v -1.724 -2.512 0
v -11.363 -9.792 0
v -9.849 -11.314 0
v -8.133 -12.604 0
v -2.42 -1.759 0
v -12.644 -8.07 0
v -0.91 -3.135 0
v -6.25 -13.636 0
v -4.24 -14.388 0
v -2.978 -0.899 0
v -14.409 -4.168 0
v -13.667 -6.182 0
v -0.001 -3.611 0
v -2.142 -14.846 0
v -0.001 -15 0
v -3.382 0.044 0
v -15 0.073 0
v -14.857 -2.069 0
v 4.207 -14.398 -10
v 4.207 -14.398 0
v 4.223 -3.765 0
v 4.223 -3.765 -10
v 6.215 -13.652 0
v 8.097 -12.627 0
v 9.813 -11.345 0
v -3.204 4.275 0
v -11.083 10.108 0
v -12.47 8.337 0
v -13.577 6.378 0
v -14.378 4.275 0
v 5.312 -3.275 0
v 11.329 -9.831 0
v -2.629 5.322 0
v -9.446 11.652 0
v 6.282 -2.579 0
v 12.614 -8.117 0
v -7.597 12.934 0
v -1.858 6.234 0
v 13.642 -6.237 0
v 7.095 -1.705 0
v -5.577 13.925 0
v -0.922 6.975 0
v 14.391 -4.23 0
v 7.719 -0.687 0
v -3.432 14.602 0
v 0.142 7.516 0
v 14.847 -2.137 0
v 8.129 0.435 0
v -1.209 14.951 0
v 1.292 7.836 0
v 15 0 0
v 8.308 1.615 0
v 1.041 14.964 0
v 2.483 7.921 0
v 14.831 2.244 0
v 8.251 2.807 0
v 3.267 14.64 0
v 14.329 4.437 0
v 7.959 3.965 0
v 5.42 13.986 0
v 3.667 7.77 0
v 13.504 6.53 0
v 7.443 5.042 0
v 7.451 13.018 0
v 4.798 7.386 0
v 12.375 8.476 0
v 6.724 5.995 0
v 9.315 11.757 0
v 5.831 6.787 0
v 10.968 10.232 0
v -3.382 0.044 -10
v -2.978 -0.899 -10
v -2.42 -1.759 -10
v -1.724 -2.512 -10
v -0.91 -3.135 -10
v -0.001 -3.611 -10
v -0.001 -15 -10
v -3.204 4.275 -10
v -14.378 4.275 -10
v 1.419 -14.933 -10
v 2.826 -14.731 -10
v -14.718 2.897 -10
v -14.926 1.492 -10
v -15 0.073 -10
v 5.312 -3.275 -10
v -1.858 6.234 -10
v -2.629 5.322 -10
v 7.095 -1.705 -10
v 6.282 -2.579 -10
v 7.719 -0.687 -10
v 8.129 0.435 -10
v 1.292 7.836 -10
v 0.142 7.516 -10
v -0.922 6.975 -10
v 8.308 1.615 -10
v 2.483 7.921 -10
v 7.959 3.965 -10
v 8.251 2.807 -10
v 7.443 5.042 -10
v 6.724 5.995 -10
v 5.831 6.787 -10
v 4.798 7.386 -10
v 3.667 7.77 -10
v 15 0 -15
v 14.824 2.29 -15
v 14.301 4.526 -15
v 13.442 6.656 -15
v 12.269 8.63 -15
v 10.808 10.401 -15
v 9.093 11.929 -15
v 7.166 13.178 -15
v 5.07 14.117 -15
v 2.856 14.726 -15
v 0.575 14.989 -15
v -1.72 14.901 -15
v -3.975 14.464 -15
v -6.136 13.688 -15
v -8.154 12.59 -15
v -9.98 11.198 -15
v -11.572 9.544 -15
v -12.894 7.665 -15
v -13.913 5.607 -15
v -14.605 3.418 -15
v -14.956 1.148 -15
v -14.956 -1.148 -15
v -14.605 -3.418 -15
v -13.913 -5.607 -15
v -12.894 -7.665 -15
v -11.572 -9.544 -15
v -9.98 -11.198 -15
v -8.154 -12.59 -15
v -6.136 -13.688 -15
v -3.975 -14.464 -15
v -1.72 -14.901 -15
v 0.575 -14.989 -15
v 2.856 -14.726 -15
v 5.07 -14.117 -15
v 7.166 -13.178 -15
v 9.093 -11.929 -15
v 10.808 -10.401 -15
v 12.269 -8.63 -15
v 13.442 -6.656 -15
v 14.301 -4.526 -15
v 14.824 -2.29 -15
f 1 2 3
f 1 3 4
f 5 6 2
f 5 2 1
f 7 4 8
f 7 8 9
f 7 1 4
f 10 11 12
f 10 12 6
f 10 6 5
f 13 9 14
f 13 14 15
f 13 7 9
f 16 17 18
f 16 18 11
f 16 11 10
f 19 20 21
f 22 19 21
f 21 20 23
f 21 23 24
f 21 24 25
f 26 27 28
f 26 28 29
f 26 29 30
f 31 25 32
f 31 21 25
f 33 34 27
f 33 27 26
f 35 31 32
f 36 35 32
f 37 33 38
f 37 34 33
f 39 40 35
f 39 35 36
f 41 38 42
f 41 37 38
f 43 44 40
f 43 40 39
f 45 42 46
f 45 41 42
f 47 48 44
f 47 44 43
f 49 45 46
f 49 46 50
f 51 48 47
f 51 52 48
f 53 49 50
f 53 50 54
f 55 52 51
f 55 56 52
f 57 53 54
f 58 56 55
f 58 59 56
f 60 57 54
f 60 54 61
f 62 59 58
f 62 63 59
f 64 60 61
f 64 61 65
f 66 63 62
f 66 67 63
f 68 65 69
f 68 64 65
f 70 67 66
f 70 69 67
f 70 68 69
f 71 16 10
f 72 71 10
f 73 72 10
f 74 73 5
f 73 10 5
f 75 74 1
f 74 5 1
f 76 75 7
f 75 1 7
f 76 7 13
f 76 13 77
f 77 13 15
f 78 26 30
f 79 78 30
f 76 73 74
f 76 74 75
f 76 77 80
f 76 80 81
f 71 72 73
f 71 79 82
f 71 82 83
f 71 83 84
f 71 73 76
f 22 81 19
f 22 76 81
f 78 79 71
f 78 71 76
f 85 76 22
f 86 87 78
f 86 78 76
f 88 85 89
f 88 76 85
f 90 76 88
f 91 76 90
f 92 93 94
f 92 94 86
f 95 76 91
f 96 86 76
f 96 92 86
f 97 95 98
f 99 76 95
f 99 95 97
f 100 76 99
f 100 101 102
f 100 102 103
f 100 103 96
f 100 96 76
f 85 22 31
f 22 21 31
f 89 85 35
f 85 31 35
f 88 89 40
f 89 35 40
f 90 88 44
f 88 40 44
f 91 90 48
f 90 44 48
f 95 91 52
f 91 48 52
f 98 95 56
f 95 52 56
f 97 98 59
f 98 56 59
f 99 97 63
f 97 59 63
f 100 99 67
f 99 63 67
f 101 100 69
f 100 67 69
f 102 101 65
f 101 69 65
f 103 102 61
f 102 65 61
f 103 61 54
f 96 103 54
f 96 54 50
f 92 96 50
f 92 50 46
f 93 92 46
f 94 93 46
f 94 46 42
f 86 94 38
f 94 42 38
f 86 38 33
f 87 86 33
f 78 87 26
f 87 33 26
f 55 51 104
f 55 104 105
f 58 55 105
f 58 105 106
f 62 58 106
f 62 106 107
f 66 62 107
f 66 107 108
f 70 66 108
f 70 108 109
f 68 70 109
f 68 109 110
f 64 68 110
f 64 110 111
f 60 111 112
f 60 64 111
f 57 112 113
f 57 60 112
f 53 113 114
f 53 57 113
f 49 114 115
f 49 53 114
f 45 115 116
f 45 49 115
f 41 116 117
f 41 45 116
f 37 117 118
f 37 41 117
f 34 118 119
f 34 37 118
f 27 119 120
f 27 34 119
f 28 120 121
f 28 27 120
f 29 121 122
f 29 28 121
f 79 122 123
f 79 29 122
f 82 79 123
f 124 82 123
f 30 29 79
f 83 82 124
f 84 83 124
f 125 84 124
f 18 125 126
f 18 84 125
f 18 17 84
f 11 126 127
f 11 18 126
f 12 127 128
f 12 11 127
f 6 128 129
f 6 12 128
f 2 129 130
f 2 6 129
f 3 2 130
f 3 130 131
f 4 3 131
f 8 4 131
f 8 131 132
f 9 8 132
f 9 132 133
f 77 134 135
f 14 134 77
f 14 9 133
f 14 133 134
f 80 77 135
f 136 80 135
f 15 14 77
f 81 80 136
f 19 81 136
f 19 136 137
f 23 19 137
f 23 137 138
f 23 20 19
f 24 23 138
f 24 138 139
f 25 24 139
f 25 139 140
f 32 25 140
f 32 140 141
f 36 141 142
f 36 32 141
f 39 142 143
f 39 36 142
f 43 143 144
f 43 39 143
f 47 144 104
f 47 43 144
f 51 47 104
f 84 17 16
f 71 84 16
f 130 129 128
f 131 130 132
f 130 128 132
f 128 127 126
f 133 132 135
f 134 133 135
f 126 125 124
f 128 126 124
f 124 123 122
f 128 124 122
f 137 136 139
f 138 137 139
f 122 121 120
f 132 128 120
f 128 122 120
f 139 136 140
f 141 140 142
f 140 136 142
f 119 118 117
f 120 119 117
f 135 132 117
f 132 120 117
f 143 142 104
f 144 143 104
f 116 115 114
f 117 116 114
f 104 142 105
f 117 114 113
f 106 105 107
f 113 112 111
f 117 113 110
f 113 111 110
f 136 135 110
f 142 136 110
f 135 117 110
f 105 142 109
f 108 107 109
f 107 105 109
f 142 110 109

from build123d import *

# Parameters (mm, degrees)
F0_R     = 15
F1_DEPTH = 15
F3_DEPTH = 10
F4_R     = 6
F5_DEPTH = 10


with BuildPart() as f1:
    # F0 (on Top) → F1 (new body)
    with BuildSketch(Plane.XY):
        Circle(F0_R)
    extrude(amount=-F1_DEPTH)

    # F2 (on Top) → F3 (cut, symmetric)
    with BuildSketch(Plane.XY):
        Polygon((4.235221, 4.27539), (-15.764779, 4.27539), (-15.764779, 0.07539), (-0.001056, 0.035212), (-0.001056, -19.964788), (4.198944, -19.964788), align=None)
    extrude(amount=F3_DEPTH, both=True, mode=Mode.SUBTRACT)

    # F4 (on Top) → F5 (cut, symmetric)
    with BuildSketch(Plane.XY):
        with Locations((2.316362, 1.923726)):
            Circle(F4_R)
    extrude(amount=F5_DEPTH, both=True, mode=Mode.SUBTRACT)


solid = f1.part
